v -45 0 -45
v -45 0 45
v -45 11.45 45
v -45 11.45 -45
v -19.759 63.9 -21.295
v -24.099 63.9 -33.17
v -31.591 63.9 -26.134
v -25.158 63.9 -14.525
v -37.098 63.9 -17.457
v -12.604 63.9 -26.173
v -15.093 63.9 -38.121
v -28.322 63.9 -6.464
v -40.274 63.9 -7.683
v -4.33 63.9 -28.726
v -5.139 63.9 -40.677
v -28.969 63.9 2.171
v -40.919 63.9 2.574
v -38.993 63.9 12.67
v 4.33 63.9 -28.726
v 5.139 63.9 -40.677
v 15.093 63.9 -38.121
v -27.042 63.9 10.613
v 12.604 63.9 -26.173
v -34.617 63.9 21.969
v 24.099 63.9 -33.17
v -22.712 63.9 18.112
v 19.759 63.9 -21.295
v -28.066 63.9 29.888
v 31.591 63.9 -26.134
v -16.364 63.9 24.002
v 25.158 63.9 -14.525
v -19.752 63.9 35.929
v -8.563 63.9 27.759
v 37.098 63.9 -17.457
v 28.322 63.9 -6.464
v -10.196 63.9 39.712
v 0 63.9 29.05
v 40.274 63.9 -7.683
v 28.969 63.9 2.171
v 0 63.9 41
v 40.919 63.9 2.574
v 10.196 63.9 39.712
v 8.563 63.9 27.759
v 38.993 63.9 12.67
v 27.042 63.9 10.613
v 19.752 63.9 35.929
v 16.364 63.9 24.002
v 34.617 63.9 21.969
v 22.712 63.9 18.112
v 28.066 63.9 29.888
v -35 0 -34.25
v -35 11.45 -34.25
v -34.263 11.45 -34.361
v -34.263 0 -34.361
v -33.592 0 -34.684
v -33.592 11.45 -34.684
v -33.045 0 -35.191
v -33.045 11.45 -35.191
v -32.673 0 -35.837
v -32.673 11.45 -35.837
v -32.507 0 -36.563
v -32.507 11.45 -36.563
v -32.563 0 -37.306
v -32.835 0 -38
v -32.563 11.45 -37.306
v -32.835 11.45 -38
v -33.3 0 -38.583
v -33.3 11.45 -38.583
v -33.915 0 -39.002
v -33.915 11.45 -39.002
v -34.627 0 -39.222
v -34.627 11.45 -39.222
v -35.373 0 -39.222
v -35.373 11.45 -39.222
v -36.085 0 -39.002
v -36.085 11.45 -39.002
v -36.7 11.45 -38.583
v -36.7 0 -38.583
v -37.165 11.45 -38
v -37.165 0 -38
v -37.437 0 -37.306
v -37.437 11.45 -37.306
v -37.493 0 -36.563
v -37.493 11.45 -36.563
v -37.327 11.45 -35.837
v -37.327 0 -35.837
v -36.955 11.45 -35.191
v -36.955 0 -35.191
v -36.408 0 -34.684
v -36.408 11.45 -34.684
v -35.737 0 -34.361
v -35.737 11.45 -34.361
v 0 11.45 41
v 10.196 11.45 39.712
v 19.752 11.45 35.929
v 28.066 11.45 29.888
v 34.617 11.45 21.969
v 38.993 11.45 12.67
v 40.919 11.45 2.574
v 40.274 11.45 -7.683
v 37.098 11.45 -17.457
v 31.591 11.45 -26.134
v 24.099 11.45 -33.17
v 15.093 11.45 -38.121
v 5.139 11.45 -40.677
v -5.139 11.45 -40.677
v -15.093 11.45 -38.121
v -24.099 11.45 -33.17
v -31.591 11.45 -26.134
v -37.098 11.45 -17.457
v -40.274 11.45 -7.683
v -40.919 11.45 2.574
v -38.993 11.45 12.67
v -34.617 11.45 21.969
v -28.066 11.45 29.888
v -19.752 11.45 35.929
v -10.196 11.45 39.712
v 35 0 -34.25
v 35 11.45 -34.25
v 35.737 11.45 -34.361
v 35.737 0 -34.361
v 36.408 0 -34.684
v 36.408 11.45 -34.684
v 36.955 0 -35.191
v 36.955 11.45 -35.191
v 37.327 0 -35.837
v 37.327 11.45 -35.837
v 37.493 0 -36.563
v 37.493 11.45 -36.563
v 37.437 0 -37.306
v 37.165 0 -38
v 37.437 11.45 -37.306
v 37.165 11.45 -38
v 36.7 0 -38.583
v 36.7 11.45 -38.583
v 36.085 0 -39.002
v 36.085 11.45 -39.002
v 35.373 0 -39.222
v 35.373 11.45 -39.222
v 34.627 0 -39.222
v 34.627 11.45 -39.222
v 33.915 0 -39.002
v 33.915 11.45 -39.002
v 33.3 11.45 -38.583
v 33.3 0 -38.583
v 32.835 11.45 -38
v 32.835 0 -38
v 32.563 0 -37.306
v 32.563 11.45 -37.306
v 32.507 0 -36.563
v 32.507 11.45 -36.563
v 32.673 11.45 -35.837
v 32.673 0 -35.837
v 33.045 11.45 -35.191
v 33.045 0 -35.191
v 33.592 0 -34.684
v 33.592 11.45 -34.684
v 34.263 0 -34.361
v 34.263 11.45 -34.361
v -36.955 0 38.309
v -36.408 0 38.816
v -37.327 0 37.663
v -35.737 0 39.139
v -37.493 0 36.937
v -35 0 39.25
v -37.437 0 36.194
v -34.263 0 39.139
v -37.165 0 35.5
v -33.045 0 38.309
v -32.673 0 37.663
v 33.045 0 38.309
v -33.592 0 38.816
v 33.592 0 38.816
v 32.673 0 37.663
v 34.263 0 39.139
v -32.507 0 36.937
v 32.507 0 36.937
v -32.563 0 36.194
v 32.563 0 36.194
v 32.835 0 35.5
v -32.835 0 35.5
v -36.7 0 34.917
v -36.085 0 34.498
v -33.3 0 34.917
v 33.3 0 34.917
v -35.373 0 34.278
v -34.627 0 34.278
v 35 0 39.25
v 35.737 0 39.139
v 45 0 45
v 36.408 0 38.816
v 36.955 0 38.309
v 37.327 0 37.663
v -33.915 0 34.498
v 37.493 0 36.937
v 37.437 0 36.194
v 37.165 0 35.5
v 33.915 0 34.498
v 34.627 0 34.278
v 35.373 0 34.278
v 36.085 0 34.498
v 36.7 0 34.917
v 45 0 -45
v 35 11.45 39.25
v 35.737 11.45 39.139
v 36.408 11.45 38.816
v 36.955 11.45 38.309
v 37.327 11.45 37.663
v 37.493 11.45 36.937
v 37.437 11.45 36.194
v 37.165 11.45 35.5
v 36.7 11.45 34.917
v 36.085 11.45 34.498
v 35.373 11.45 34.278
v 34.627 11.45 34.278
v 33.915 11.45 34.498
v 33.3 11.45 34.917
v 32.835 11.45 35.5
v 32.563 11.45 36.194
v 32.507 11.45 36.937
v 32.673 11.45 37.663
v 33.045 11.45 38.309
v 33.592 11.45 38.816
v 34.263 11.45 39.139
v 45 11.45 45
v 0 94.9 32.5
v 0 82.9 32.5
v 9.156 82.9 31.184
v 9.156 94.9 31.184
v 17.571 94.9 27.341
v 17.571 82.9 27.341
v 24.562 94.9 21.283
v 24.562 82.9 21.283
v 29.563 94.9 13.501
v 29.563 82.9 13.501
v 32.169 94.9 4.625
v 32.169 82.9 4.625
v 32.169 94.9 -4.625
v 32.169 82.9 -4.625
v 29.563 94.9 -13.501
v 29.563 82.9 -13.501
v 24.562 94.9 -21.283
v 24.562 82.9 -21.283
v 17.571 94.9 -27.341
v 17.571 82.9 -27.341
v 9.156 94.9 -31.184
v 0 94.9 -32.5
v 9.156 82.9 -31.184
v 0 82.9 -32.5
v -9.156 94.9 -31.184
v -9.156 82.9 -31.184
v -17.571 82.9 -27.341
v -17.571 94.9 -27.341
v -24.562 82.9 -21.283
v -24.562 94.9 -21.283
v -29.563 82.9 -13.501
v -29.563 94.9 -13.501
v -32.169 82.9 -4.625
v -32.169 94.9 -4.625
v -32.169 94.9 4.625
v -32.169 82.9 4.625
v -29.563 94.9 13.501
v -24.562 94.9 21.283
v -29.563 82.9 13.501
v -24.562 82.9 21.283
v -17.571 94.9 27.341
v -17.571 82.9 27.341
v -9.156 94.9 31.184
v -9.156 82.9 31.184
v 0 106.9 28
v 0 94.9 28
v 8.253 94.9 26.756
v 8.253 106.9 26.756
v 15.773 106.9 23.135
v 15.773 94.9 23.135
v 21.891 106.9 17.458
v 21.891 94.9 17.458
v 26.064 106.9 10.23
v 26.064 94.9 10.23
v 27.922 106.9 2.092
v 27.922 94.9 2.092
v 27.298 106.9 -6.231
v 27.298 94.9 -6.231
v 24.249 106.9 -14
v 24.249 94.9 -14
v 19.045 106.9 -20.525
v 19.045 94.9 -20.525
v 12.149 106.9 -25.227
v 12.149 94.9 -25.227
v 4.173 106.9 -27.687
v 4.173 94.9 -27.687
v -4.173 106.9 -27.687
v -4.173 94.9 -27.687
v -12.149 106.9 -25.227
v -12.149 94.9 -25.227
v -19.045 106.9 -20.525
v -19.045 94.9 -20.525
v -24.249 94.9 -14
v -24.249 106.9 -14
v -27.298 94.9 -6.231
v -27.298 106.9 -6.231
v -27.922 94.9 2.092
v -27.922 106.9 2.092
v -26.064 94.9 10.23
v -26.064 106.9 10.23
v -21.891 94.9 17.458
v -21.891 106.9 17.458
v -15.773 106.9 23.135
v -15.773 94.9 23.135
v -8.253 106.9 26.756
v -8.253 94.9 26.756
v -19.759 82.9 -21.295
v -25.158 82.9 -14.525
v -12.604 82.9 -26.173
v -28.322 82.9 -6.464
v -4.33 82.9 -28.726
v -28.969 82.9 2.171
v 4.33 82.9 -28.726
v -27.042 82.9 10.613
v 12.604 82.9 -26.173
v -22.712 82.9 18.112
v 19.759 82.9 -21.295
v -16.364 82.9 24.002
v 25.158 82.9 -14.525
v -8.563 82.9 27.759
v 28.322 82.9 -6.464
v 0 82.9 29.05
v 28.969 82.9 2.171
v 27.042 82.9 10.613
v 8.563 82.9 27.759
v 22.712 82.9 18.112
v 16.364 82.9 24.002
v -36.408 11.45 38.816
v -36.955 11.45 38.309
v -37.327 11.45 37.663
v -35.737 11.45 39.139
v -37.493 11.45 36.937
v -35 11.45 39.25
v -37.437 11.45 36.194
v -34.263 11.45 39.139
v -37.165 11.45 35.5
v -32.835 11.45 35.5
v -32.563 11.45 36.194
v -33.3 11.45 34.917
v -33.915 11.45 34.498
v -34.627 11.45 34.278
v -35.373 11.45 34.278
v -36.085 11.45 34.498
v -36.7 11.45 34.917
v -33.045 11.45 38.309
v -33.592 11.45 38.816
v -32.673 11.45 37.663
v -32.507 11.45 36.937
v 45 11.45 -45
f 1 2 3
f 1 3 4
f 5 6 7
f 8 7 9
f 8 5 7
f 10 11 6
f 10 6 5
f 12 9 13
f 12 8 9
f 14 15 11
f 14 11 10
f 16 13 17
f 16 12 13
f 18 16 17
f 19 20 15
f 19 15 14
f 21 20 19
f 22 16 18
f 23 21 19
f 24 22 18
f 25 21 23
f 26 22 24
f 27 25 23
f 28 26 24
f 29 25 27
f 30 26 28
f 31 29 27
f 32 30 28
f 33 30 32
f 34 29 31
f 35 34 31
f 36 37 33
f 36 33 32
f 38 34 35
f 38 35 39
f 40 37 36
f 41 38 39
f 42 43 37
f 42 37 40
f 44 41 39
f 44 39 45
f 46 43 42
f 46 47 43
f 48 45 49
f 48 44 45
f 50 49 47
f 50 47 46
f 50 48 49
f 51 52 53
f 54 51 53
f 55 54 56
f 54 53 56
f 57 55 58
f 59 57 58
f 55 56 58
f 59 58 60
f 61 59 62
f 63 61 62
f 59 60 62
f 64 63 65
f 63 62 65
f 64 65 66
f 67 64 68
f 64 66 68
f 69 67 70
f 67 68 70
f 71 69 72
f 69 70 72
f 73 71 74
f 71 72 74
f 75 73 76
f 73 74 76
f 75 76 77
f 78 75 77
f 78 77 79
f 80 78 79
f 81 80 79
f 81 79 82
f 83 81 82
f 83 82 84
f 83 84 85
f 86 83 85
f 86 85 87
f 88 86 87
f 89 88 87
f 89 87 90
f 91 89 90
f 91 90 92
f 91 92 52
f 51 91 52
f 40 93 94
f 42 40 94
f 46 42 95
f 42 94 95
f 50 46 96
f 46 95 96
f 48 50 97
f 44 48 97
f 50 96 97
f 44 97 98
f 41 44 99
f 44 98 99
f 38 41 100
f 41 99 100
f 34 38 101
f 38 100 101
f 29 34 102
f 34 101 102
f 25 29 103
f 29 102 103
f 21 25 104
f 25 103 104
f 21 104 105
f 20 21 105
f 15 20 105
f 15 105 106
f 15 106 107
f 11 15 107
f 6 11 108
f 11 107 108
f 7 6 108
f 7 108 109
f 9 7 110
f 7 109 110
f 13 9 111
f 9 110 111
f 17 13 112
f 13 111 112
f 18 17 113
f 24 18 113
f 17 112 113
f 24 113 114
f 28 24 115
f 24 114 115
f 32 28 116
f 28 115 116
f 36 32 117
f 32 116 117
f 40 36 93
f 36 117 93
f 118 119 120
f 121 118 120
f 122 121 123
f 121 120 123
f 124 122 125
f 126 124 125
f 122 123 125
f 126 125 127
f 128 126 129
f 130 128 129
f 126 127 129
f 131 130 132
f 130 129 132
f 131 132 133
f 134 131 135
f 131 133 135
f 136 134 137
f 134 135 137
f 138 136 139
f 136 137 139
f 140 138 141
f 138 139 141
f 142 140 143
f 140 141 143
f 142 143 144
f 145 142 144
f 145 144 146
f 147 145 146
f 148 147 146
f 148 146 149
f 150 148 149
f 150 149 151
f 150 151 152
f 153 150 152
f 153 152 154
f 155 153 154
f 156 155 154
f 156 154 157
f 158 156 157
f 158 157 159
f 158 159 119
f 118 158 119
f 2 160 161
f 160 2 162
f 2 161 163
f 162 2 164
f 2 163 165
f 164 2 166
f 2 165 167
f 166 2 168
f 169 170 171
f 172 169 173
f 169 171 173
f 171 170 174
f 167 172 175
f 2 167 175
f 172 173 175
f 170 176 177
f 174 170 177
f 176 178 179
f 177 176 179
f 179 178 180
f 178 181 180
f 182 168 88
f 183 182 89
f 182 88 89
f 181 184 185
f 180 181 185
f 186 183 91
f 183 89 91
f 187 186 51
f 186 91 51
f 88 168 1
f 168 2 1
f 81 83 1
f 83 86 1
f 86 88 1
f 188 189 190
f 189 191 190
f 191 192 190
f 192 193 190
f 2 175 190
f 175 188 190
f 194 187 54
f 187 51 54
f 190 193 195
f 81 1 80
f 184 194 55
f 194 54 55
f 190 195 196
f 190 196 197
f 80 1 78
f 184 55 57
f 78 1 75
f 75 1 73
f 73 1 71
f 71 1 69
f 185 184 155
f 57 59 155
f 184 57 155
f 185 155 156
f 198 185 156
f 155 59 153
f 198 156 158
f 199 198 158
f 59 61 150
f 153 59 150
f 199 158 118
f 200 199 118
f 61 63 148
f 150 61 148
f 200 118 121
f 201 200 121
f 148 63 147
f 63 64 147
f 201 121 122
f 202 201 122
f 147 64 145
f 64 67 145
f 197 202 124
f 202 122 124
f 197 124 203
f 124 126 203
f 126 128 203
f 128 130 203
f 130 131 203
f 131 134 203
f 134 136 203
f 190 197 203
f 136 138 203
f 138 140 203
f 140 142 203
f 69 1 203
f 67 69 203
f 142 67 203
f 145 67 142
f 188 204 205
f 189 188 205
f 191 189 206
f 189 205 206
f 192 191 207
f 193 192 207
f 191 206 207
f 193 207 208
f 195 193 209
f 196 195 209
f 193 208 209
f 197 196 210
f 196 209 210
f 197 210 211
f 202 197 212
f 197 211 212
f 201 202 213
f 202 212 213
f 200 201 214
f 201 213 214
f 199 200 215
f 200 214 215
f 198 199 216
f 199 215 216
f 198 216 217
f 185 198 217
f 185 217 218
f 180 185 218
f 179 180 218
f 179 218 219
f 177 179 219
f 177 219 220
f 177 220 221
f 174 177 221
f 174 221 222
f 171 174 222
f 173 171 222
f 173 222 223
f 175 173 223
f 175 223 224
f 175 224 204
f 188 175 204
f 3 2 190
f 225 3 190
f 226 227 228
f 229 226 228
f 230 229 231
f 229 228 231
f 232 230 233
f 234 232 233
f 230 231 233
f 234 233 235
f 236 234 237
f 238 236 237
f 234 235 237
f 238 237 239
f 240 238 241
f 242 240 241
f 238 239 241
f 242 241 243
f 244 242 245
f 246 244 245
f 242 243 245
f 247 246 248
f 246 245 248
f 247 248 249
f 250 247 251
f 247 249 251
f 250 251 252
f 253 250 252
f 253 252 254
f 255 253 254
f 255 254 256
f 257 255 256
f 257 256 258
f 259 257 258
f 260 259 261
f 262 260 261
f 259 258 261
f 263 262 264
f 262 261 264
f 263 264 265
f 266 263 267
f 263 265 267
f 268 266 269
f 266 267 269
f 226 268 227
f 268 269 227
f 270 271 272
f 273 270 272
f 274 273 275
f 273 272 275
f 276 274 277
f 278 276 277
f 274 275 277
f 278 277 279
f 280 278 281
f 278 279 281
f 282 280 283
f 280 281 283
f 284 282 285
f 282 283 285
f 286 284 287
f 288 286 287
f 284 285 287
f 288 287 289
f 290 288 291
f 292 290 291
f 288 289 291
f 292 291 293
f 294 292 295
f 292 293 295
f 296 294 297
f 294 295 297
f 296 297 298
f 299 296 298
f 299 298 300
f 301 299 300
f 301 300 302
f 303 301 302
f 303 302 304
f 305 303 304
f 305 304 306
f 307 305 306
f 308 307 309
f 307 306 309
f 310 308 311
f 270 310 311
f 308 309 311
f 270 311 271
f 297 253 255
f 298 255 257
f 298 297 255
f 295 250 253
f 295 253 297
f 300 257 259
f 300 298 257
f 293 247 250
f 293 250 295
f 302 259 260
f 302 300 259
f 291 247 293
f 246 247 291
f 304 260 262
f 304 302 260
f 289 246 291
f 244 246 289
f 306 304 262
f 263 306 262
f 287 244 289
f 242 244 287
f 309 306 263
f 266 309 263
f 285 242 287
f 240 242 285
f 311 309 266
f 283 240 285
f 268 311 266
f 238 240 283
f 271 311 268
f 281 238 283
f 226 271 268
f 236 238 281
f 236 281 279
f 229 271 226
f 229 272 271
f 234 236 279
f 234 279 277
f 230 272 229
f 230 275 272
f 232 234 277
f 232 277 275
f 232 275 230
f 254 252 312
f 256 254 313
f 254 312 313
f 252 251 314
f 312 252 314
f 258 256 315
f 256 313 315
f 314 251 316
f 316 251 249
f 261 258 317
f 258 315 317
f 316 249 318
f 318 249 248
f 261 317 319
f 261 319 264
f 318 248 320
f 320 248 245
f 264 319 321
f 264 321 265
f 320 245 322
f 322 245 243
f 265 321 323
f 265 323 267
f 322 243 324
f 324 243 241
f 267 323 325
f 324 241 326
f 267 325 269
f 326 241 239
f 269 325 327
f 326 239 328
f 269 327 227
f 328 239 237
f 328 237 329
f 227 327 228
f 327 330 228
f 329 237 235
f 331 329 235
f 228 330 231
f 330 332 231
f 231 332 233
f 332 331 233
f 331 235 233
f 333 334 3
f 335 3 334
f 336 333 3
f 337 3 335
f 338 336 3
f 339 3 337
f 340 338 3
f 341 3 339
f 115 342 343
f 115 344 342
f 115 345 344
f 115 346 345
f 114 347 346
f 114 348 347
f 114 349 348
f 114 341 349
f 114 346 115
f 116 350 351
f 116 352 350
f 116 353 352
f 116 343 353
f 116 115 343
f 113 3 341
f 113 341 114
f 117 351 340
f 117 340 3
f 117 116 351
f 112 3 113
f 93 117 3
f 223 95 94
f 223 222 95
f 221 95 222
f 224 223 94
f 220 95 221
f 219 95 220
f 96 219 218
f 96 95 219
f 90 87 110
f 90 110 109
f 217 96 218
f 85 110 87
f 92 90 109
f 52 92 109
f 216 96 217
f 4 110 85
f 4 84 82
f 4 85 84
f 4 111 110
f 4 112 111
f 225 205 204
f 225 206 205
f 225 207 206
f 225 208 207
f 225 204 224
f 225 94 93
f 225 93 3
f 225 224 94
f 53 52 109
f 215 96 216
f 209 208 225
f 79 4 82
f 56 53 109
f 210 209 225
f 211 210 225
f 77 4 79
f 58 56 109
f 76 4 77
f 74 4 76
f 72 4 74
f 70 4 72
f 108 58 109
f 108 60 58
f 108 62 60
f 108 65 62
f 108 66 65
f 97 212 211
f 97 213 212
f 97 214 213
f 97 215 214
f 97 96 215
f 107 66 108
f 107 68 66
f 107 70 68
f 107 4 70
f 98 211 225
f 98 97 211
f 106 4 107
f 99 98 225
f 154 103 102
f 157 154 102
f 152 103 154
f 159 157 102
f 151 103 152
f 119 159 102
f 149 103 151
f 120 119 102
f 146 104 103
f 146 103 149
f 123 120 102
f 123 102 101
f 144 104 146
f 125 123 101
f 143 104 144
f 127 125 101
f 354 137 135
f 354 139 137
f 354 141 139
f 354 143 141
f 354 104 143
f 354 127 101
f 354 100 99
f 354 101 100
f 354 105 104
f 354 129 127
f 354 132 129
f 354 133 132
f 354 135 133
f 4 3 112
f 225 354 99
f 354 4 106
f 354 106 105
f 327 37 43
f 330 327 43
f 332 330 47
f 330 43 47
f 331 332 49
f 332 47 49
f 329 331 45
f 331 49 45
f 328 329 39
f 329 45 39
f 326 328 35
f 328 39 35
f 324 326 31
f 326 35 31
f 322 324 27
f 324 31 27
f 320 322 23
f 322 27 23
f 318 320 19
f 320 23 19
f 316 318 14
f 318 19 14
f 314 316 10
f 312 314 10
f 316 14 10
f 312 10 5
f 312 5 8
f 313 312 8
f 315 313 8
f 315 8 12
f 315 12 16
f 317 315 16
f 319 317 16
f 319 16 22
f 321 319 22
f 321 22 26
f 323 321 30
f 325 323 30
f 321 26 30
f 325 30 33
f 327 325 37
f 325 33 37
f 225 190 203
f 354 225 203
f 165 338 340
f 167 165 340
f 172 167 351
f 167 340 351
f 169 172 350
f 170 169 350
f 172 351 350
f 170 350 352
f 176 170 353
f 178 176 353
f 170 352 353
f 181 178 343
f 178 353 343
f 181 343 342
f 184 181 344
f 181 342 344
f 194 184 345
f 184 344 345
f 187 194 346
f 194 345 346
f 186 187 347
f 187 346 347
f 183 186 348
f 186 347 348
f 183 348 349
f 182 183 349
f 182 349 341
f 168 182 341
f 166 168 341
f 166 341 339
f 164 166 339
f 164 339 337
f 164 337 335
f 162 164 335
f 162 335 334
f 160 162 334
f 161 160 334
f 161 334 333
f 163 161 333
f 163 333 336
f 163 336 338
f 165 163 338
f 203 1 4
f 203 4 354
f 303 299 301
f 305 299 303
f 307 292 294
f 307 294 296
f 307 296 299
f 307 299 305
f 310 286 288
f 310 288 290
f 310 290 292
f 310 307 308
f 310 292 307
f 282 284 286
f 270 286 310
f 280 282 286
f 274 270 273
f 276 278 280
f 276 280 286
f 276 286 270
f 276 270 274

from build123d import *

# Parameters (mm, degrees)
SKETCH1_W           = 90
SKETCH1_H           = 90
BOSS_EXTRUDE1_DEPTH = 11.45
SKETCH2_R           = 41
BOSS_EXTRUDE2_DEPTH = 52.45
SKETCH3_R           = 29.05
BOSS_EXTRUDE3_DEPTH = 19
SKETCH4_R           = 32.5
BOSS_EXTRUDE4_DEPTH = 12
SKETCH5_R           = 28
BOSS_EXTRUDE5_DEPTH = 12
SKETCH6_R           = 2.5
CUT_EXTRUDE1_DEPTH  = 115.720105038


with BuildPart() as part:
    # Sketch1 → Boss-Extrude1 (new body)
    with BuildSketch(Plane(origin=(0, 0, 0), x_dir=(1, 0, 0), z_dir=(0, 1, 0))):
        Rectangle(SKETCH1_W, SKETCH1_H)
    extrude(amount=BOSS_EXTRUDE1_DEPTH)

    # Sketch2 → Boss-Extrude2 (add)
    with BuildSketch(Plane(origin=(0, 11.45, 0), x_dir=(1, 0, 0), z_dir=(0, 1, 0))):
        with Locations(Location((0, 0, 0), (0, 0, 270))):
            Circle(SKETCH2_R)
    extrude(amount=BOSS_EXTRUDE2_DEPTH)

    # Sketch3 → Boss-Extrude3 (add)
    with BuildSketch(Plane(origin=(0, 63.9, 0), x_dir=(1, 0, 0), z_dir=(0, 1, 0))):
        with Locations(Location((0, 0, 0), (0, 0, 270))):
            Circle(SKETCH3_R)
    extrude(amount=BOSS_EXTRUDE3_DEPTH)

    # Sketch4 → Boss-Extrude4 (add)
    with BuildSketch(Plane(origin=(0, 82.9, 0), x_dir=(1, 0, 0), z_dir=(0, 1, 0))):
        with Locations(Location((0, 0, 0), (0, 0, 270))):
            Circle(SKETCH4_R)
    extrude(amount=BOSS_EXTRUDE4_DEPTH)

    # Sketch5 → Boss-Extrude5 (add)
    with BuildSketch(Plane(origin=(0, 94.9, 0), x_dir=(1, 0, 0), z_dir=(0, 1, 0))):
        with Locations(Location((0, 0, 0), (0, 0, 270))):
            Circle(SKETCH5_R)
    extrude(amount=BOSS_EXTRUDE5_DEPTH)

    # Sketch6 → Cut-Extrude1 (cut, through all)
    with BuildSketch(Plane(origin=(0, 11.45, 0), x_dir=(1, 0, 0), z_dir=(0, 1, 0))):
        with Locations(Location((-35, 36.75, 0), (0, 0, 270))):
            Circle(SKETCH6_R)
        with Locations(Location((35, 36.75, 0), (0, 0, 270))):
            Circle(SKETCH6_R)
        with Locations(Location((35, -36.75, 0), (0, 0, 270))):
            Circle(SKETCH6_R)
        with Locations(Location((-35, -36.75, 0), (0, 0, 270))):
            Circle(SKETCH6_R)
    extrude(amount=-CUT_EXTRUDE1_DEPTH, mode=Mode.SUBTRACT)


solid = part.part
